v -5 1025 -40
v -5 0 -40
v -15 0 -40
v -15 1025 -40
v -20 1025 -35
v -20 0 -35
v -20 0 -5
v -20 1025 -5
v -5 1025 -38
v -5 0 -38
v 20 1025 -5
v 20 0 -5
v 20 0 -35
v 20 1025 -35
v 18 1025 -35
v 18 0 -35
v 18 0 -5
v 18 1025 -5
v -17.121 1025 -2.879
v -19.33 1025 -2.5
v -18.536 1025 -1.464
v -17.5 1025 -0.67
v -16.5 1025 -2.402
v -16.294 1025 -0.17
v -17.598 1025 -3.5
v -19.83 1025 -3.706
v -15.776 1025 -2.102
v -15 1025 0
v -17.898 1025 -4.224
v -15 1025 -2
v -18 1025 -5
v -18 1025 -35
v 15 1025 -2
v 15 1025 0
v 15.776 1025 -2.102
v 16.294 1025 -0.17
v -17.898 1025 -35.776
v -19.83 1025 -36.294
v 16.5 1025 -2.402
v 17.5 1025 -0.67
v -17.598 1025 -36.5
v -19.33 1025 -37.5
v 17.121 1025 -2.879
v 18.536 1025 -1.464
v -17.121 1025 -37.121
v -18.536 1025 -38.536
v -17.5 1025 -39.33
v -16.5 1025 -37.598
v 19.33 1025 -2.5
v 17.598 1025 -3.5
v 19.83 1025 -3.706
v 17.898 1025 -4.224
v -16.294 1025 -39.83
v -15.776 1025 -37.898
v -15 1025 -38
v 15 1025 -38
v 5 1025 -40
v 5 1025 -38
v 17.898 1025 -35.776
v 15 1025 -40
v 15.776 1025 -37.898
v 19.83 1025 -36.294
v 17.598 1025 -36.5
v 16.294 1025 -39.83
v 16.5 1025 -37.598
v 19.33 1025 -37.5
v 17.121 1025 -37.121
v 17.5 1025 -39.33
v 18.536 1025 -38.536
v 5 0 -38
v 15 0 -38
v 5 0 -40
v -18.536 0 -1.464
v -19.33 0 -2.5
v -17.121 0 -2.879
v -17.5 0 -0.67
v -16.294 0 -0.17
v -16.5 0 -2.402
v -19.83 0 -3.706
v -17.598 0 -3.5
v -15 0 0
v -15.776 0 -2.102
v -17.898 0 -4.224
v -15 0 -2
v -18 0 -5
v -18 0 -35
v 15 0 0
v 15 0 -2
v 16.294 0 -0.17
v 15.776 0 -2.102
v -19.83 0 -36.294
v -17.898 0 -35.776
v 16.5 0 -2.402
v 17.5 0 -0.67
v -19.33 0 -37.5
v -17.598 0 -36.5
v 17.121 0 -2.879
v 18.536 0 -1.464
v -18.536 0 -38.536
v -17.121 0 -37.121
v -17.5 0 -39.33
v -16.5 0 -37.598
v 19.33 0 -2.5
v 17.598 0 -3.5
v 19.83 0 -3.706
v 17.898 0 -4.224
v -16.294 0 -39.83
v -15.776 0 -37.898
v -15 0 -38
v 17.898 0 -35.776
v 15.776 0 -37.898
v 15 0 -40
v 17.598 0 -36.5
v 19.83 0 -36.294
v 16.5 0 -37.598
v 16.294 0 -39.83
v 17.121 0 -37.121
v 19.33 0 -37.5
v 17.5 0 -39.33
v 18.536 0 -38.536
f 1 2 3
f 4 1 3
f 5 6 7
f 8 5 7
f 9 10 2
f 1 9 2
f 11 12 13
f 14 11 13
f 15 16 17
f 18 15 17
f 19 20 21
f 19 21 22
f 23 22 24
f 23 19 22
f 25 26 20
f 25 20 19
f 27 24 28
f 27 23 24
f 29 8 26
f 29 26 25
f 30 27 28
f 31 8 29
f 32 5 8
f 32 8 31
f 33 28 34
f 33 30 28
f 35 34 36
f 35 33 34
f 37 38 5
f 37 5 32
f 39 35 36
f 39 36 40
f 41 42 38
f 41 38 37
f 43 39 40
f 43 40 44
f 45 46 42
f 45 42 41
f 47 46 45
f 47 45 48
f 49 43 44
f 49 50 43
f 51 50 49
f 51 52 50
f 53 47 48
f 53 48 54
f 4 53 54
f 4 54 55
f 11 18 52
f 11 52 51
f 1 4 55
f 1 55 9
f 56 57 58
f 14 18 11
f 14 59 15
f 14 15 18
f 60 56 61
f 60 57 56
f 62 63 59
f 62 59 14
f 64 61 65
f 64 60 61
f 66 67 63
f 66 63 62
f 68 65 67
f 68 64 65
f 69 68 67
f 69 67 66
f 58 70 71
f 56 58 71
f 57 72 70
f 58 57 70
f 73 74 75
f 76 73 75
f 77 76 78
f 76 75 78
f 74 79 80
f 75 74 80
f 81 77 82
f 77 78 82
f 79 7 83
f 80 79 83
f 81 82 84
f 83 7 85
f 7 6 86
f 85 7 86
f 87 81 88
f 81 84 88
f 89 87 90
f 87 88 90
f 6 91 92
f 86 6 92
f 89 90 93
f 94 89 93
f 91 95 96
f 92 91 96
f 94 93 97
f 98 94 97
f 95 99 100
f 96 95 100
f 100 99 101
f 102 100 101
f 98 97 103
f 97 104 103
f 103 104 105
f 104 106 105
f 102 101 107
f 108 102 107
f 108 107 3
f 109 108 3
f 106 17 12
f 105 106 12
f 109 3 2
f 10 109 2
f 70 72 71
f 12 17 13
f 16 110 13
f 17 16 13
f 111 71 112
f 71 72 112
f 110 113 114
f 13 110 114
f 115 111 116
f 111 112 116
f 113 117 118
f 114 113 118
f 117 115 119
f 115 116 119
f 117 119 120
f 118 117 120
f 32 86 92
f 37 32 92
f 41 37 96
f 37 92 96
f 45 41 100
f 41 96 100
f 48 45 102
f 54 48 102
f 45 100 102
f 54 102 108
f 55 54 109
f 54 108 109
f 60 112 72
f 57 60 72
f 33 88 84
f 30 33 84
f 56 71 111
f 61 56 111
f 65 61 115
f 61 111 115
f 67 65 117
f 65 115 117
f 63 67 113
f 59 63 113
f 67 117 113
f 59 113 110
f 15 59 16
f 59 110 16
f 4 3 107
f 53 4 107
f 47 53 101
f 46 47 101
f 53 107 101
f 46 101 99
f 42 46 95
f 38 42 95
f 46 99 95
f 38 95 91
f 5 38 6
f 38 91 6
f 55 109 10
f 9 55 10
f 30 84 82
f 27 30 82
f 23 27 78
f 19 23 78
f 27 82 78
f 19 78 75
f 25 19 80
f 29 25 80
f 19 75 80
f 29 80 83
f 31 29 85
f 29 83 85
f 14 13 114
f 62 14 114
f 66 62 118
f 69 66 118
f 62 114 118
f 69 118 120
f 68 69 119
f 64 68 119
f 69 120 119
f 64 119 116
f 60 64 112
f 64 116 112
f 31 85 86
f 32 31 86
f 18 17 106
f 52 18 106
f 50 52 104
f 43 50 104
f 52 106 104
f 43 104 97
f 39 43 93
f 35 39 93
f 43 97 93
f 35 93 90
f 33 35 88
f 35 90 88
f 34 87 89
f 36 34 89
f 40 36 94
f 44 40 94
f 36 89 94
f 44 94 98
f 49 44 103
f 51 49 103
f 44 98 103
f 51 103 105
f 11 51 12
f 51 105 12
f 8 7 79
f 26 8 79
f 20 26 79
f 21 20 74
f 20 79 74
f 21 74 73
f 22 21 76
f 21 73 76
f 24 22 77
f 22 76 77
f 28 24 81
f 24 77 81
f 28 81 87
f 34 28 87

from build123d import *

# Parameters (mm, degrees)
EXTRUDE_1_DEPTH = 1025


with BuildPart() as part:
    # Эскиз1 → Вытянуть-Тонкостенный1 (new body)
    with BuildSketch(Plane(origin=(0, 0, 0), x_dir=(1, 0, 0), z_dir=(0, 1, 0))):
        with BuildLine():
            Line((-5, 40), (-15, 40))
            ThreePointArc((-15, 40), (-18.535533906, 38.535533906), (-20, 35))
            Line((-20, 35), (-20, 5))
            ThreePointArc((-20, 5), (-18.535533906, 1.464466094), (-15, 0))
            Line((-15, 0), (15, 0))
            ThreePointArc((15, 0), (18.535533906, 1.464466094), (20, 5))
            Line((20, 5), (20, 35))
            ThreePointArc((20, 35), (18.535533906, 38.535533906), (15, 40))
            Line((15, 40), (5, 40))
            Line((5, 40), (5, 38))
            Line((5, 38), (15, 38))
            ThreePointArc((15, 38), (17.121320344, 37.121320344), (18, 35))
            Line((18, 35), (18, 5))
            ThreePointArc((18, 5), (17.121320344, 2.878679656), (15, 2))
            Line((15, 2), (-15, 2))
            ThreePointArc((-15, 2), (-17.121320344, 2.878679656), (-18, 5))
            Line((-18, 5), (-18, 35))
            ThreePointArc((-18, 35), (-17.121320344, 37.121320344), (-15, 38))
            Line((-15, 38), (-5, 38))
            Line((-5, 38), (-5, 40))
        make_face()
    extrude(amount=EXTRUDE_1_DEPTH)


solid = part.part
